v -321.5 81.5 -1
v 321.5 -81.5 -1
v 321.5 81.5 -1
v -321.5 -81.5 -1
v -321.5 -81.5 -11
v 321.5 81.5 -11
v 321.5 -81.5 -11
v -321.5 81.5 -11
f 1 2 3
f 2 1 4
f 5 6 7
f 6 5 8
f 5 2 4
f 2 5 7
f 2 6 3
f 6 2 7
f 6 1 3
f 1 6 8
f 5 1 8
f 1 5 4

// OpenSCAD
translate([0,0,-6]) cube([643,163,10], center = true);
scale([1, 1, 4]) {
    surface(file = "height_map_avg4.dat", center = true, convexity = 5);
}
